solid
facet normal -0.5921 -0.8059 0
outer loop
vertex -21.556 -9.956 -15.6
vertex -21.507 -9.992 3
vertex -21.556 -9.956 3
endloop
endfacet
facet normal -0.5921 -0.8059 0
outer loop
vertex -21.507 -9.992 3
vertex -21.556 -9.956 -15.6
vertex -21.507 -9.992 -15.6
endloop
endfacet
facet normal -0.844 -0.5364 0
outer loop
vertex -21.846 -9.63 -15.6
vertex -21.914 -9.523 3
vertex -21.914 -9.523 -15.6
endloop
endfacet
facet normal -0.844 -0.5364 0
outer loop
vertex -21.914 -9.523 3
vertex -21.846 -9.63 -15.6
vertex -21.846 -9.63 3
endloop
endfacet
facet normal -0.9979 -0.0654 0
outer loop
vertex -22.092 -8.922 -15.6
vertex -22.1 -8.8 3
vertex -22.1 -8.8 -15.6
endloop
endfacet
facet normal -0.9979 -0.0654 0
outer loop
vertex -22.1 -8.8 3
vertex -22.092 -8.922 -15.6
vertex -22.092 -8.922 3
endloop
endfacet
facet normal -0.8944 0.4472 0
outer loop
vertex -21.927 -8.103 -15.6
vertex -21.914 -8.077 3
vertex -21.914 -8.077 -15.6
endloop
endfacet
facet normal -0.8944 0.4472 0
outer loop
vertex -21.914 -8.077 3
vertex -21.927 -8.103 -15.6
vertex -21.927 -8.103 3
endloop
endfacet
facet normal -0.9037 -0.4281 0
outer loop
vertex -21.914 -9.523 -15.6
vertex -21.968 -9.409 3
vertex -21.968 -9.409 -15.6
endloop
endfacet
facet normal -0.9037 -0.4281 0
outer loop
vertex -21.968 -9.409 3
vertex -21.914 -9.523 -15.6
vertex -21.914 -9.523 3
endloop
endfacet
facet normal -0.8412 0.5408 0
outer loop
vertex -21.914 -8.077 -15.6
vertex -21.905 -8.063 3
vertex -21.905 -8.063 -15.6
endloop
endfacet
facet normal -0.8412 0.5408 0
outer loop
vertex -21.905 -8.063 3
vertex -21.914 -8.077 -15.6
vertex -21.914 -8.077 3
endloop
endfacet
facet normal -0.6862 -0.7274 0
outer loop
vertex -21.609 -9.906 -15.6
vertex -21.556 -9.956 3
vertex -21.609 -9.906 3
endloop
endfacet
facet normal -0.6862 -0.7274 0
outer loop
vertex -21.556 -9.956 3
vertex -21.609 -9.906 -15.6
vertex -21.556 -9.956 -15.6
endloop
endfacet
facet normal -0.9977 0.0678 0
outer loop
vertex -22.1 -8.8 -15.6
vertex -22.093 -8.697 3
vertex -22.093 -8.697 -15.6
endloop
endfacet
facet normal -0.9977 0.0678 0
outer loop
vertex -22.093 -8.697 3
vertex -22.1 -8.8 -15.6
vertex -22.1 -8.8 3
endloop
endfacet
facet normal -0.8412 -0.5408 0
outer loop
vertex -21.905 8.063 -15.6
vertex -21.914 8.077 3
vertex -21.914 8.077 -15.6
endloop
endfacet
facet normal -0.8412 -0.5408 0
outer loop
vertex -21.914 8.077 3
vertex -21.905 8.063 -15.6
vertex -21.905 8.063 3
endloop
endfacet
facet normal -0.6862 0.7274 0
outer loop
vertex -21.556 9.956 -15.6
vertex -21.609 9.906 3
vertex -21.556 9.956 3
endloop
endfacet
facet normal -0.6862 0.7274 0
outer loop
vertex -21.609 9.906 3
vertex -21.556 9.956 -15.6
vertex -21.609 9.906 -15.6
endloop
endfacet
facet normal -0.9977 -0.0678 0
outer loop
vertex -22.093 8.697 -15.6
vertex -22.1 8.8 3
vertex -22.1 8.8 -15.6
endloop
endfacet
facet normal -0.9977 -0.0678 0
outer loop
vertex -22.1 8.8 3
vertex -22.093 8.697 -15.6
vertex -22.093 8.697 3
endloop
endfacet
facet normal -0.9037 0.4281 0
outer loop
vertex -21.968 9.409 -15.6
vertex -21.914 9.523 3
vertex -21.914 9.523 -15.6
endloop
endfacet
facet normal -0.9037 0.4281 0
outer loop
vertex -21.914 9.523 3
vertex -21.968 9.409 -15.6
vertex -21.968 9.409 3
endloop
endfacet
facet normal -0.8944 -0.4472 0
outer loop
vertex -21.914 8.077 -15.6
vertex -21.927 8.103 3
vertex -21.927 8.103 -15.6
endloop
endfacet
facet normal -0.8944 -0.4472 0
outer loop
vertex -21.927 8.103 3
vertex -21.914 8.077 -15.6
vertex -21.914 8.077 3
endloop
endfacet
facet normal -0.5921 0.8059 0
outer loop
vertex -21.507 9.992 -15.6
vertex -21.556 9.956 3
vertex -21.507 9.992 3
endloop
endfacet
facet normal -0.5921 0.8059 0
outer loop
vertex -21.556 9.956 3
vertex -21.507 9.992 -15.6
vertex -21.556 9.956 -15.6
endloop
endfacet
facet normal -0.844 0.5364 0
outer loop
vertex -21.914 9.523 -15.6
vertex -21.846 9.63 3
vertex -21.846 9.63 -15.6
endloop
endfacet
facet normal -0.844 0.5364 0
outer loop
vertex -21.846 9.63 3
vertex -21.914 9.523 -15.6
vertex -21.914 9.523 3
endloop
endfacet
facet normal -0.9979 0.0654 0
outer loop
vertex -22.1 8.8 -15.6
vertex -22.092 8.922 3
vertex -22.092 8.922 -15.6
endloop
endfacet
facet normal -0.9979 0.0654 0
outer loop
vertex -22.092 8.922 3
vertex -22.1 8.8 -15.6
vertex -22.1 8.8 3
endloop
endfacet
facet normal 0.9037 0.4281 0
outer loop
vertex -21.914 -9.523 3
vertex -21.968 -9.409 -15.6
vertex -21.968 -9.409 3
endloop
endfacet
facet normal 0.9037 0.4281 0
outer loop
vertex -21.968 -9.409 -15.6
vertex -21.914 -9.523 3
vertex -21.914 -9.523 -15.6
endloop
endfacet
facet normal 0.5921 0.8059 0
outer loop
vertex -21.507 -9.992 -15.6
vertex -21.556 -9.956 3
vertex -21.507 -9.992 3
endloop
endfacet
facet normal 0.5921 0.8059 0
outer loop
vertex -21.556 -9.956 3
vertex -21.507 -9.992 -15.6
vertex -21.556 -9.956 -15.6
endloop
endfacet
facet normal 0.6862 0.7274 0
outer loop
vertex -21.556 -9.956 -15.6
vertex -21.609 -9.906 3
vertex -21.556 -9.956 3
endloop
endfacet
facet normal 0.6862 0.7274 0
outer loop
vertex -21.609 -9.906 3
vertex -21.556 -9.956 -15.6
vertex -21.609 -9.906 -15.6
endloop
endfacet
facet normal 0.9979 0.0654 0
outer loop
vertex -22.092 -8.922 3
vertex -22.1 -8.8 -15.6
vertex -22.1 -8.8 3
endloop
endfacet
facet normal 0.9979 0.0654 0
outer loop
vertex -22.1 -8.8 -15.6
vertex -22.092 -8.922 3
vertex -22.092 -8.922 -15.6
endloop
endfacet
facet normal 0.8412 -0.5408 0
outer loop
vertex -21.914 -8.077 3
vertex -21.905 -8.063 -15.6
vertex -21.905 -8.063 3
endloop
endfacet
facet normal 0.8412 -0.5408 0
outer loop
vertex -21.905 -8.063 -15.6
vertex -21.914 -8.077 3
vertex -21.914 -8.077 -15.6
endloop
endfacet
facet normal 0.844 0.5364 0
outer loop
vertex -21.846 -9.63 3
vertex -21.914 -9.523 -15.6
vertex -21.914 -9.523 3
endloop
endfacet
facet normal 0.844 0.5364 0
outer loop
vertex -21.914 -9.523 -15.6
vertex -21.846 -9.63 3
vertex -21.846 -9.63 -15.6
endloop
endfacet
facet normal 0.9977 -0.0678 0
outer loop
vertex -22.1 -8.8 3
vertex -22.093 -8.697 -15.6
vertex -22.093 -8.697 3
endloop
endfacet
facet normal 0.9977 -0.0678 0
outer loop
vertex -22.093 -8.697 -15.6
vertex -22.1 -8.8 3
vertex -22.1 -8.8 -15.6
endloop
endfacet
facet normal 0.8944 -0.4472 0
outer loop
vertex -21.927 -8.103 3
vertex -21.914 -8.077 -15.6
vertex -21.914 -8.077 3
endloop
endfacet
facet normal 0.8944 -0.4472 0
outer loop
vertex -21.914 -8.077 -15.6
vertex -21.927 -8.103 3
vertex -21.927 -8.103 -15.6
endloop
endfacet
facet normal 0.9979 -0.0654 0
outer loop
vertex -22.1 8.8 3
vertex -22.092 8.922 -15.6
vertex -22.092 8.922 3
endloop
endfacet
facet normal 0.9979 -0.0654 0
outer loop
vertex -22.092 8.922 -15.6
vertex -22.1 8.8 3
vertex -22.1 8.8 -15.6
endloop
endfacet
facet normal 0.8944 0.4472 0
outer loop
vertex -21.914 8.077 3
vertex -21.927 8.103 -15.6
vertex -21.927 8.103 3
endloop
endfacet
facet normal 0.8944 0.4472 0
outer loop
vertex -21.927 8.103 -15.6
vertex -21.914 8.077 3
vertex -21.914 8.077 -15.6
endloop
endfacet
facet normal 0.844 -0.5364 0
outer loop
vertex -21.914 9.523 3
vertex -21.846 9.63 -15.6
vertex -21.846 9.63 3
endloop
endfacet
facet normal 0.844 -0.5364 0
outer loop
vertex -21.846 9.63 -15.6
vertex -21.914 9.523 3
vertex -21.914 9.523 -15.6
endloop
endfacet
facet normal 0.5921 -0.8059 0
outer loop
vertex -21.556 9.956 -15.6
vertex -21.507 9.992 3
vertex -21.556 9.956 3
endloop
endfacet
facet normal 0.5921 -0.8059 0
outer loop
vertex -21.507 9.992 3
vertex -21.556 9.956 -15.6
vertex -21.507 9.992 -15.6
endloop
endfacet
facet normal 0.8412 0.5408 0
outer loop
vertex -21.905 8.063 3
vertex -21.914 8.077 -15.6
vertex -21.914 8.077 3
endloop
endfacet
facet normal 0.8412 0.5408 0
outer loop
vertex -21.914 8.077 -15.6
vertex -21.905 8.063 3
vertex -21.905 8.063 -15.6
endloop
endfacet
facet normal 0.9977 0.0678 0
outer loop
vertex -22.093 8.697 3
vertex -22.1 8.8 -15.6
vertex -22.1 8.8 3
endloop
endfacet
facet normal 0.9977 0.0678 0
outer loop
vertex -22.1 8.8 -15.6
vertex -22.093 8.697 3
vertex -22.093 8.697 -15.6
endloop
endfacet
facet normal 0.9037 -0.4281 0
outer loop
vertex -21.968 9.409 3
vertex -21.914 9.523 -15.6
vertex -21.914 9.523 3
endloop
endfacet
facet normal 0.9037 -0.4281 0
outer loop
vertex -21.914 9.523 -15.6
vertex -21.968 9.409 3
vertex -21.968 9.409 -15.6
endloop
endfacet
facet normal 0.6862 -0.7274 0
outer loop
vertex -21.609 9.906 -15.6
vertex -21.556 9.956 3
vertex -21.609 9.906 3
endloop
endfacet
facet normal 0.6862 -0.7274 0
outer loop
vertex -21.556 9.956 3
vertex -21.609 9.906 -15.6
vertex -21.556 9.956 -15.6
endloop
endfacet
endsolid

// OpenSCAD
intersection(){
union(){$fn = 50;

difference() {
	union() {
		translate(v = [-20.6, -8.8, 7]) {
			rotate(a = [0, 0, 0]) {
				difference() {
					union() {
						translate(v = [0, 0, -1.7]) {
							cylinder(h = 1.7, r1 = 1.5, r2 = 2.9);
						}
						translate(v = [0, 0, -30.0]) {
							cylinder(h = 30, r = 1.5);
						}
					}
					union();
				}
			}
		}
		translate(v = [-20.6, -8.8, -20.5]) {
			rotate(a = [0, 0, 0]) {
				difference() {
					union() {
						translate(v = [0, 0, -2.4]) {
							linear_extrude(height = 2.4) {
								polygon(points = [[3.1734999999999998, 0.0], [1.5867500000000003, 2.7483316189099156], [-1.5867499999999992, 2.748331618909916], [-3.1734999999999998, 3.886416617094125e-16], [-1.5867500000000012, -2.748331618909915], [1.5867499999999977, -2.748331618909917]]);
							}
						}
					}
					union();
				}
			}
		}
		translate(v = [-20.6, 8.8, 7]) {
			rotate(a = [0, 0, 0]) {
				difference() {
					union() {
						translate(v = [0, 0, -1.7]) {
							cylinder(h = 1.7, r1 = 1.5, r2 = 2.9);
						}
						translate(v = [0, 0, -30.0]) {
							cylinder(h = 30, r = 1.5);
						}
					}
					union();
				}
			}
		}
		translate(v = [-20.6, 8.8, -20.5]) {
			rotate(a = [0, 0, 0]) {
				difference() {
					union() {
						translate(v = [0, 0, -2.4]) {
							linear_extrude(height = 2.4) {
								polygon(points = [[3.1734999999999998, 0.0], [1.5867500000000003, 2.7483316189099156], [-1.5867499999999992, 2.748331618909916], [-3.1734999999999998, 3.886416617094125e-16], [-1.5867500000000012, -2.748331618909915], [1.5867499999999977, -2.748331618909917]]);
							}
						}
					}
					union();
				}
			}
		}
		translate(v = [-37.5, -15, -18]) {
			rotate(a = [0, 180, 0]) {
				difference() {
					union() {
						translate(v = [0, 0, -1.7]) {
							cylinder(h = 1.7, r1 = 1.5, r2 = 2.9);
						}
						translate(v = [0, 0, -25.0]) {
							cylinder(h = 25, r = 1.5);
						}
					}
					union();
				}
			}
		}
		translate(v = [-37.5, -15, 4]) {
			rotate(a = [0, 0, 0]) {
				difference() {
					union() {
						linear_extrude(height = 2.4) {
							polygon(points = [[3.1734999999999998, 0.0], [1.5867500000000003, 2.7483316189099156], [-1.5867499999999992, 2.748331618909916], [-3.1734999999999998, 3.886416617094125e-16], [-1.5867500000000012, -2.748331618909915], [1.5867499999999977, -2.748331618909917]]);
						}
					}
					union();
				}
			}
		}
		translate(v = [-37.5, 15, -18]) {
			rotate(a = [0, 180, 0]) {
				difference() {
					union() {
						translate(v = [0, 0, -1.7]) {
							cylinder(h = 1.7, r1 = 1.5, r2 = 2.9);
						}
						translate(v = [0, 0, -25.0]) {
							cylinder(h = 25, r = 1.5);
						}
					}
					union();
				}
			}
		}
		translate(v = [-37.5, 15, 4]) {
			rotate(a = [0, 0, 0]) {
				difference() {
					union() {
						linear_extrude(height = 2.4) {
							polygon(points = [[3.1734999999999998, 0.0], [1.5867500000000003, 2.7483316189099156], [-1.5867499999999992, 2.748331618909916], [-3.1734999999999998, 3.886416617094125e-16], [-1.5867500000000012, -2.748331618909915], [1.5867499999999977, -2.748331618909917]]);
						}
					}
					union();
				}
			}
		}
		translate(v = [7.5, -15, -18]) {
			rotate(a = [0, 180, 0]) {
				difference() {
					union() {
						translate(v = [0, 0, -1.7]) {
							cylinder(h = 1.7, r1 = 1.5, r2 = 2.9);
						}
						translate(v = [0, 0, -25.0]) {
							cylinder(h = 25, r = 1.5);
						}
					}
					union();
				}
			}
		}
		translate(v = [7.5, -15, 4]) {
			rotate(a = [0, 0, 0]) {
				difference() {
					union() {
						linear_extrude(height = 2.4) {
							polygon(points = [[3.1734999999999998, 0.0], [1.5867500000000003, 2.7483316189099156], [-1.5867499999999992, 2.748331618909916], [-3.1734999999999998, 3.886416617094125e-16], [-1.5867500000000012, -2.748331618909915], [1.5867499999999977, -2.748331618909917]]);
						}
					}
					union();
				}
			}
		}
		translate(v = [7.5, 15, -18]) {
			rotate(a = [0, 180, 0]) {
				difference() {
					union() {
						translate(v = [0, 0, -1.7]) {
							cylinder(h = 1.7, r1 = 1.5, r2 = 2.9);
						}
						translate(v = [0, 0, -25.0]) {
							cylinder(h = 25, r = 1.5);
						}
					}
					union();
				}
			}
		}
		translate(v = [7.5, 15, 4]) {
			rotate(a = [0, 0, 0]) {
				difference() {
					union() {
						linear_extrude(height = 2.4) {
							polygon(points = [[3.1734999999999998, 0.0], [1.5867500000000003, 2.7483316189099156], [-1.5867499999999992, 2.748331618909916], [-3.1734999999999998, 3.886416617094125e-16], [-1.5867500000000012, -2.748331618909915], [1.5867499999999977, -2.748331618909917]]);
						}
					}
					union();
				}
			}
		}
	}
	union();
}
}
union(){
$fn = 50;

difference() {
	union() {
		translate(v = [0, 0, 0]) {
			rotate(a = [0, 0, 0]) {
				difference() {
					union() {
						translate(v = [-50.8, 0, -5.700000000000001]) {
							rotate(a = [0, 90, 0]) {
								cylinder(h = 14.2, r = 9.95);
							}
						}
					}
					union() {
						translate(v = [-52.0, -12.0, -23.2]) {
							cube(size = [16, 24, 10.0]);
						}
						translate(v = [-52.0, -12.0, 1.799999999999999]) {
							cube(size = [16, 24, 10.0]);
						}
					}
				}
			}
		}
		translate(v = [0, 0, 0]) {
			rotate(a = [0, 0, 0]) {
				difference() {
					union() {
						translate(v = [0, 0, -24.600000000000005]) {
							cylinder(h = 36.6, r = 2.7);
						}
					}
					union() {
						translate(v = [-20.0, -21.85, -25.6]) {
							cube(size = [40, 20, 38.6]);
						}
						translate(v = [-20.0, 1.8499999999999996, -25.6]) {
							cube(size = [40, 20, 38.6]);
						}
					}
				}
			}
		}
		translate(v = [-36.8, -11.2, -15.600000000000001]) {
			cube(size = [44.0, 22.4, 18.6]);
		}
		translate(v = [7.099999999999999, -7.199999999999999, -15.600000000000001]) {
			cube(size = [4.1, 14.399999999999999, 18.6]);
		}
		translate(v = [7.199999999999999, -7.199999999999999, -15.600000000000001]) {
			cylinder(h = 18.6, r = 4);
		}
		translate(v = [7.199999999999999, 7.199999999999999, -15.600000000000001]) {
			cylinder(h = 18.6, r = 4);
		}
		translate(v = [11.100000000000001, -2.5, -7.700000000000001]) {
			cube(size = [4.9, 5, 2.8000000000000007]);
		}
		translate(v = [-11.25, 0, -17.6]) {
			cylinder(h = 2.1, r = 2);
		}
		translate(v = [-52.6, 0, -6.300000000000001]) {
			rotate(a = [0, 90, 0]) {
				cylinder(h = 2.1, r = 4.95);
			}
		}
		translate(v = [-54.6, 0, -6.300000000000001]) {
			rotate(a = [0, 90, 0]) {
				cylinder(h = 2.1, r = 1);
			}
		}
		translate(v = [-49.0, -8.0, 1.6999999999999993]) {
			cube(size = [2, 6, 0.5]);
		}
		translate(v = [-49.0, 2.0, 1.6999999999999993]) {
			cube(size = [2, 6, 0.5]);
		}
	}
	union() {
		translate(v = [14, 0, -8.3]) {
			cylinder(h = 4, r = 1.5);
		}
		translate(v = [-20.6, -8.8, -16.6]) {
			cylinder(h = 20.6, r = 1.5);
		}
		translate(v = [-20.6, 8.8, -16.6]) {
			cylinder(h = 20.6, r = 1.5);
		}
	}
}

}

}
